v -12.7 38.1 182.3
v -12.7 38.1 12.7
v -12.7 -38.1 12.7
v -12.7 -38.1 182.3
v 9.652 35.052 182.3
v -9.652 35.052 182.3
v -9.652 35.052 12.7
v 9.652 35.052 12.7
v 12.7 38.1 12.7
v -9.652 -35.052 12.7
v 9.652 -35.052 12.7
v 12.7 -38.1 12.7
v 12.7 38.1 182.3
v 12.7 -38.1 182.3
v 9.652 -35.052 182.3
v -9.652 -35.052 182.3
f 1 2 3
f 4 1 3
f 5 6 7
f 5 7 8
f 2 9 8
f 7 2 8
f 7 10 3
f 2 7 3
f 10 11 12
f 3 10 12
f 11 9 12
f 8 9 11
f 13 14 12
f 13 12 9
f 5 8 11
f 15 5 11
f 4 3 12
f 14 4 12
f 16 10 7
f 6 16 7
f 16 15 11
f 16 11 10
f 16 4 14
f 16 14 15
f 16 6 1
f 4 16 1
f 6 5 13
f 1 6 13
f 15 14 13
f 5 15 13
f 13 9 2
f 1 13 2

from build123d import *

# Parameters (mm, degrees)
SKETCH2_W               = 9.652
SKETCH2_H               = 3.048
SKETCH2_W_2             = 3.048
SKETCH2_H_2             = 35.052
BOSS_EXTRUDE1_DEPTH     = 195
CUT_EXTRUDE1_DEPTH      = 323.7
CUT_EXTRUDE1_DEPTH_BACK = 1


with BuildPart() as part:
    # Sketch2 → Boss-Extrude1 (new body)
    with BuildSketch(Plane.XY):
        Polygon((-12.7, 0), (-9.652, 0), (-9.652, 35.052), (-9.652, 38.1), (-12.7, 38.1), align=None)
        with Locations((-4.826, 36.576)):
            Rectangle(SKETCH2_W, SKETCH2_H)
        Polygon((0, 38.1), (0, 35.052), (9.652, 35.052), (9.652, 0), (12.7, 0), (12.7, 38.1), align=None)
        with Locations((11.176, -17.526)):
            Rectangle(SKETCH2_W_2, SKETCH2_H_2)
        Polygon((-9.652, -35.052), (-9.652, 0), (-12.7, 0), (-12.7, -38.1), (0, -38.1), (0, -35.052), align=None)
        Polygon((9.652, -35.052), (0, -35.052), (0, -38.1), (12.7, -38.1), (12.7, -35.052), align=None)
    extrude(amount=BOSS_EXTRUDE1_DEPTH)

    # Sketch3 → Cut-Extrude1 (cut, two sides)
    with BuildSketch(Plane(origin=(310, 0, 195), x_dir=(0, 0, 1), z_dir=(-1, 0, 0))) as cut_extrude1_sk:
        Polygon((-12.7, -38.1), (-12.7, 38.1), (12.7, 38.1), align=None)
        Polygon((12.7, -38.1), (-12.7, -38.1), (12.7, 38.1), align=None)
        Polygon((-182.3, 38.1), (-207.7, 38.1), (-207.7, -38.1), align=None)
        Polygon((-182.3, -38.1), (-207.7, -38.1), (-182.3, 38.1), align=None)
    extrude(amount=CUT_EXTRUDE1_DEPTH, mode=Mode.SUBTRACT)
    extrude(cut_extrude1_sk.sketch, amount=-CUT_EXTRUDE1_DEPTH_BACK, mode=Mode.SUBTRACT)


solid = part.part
